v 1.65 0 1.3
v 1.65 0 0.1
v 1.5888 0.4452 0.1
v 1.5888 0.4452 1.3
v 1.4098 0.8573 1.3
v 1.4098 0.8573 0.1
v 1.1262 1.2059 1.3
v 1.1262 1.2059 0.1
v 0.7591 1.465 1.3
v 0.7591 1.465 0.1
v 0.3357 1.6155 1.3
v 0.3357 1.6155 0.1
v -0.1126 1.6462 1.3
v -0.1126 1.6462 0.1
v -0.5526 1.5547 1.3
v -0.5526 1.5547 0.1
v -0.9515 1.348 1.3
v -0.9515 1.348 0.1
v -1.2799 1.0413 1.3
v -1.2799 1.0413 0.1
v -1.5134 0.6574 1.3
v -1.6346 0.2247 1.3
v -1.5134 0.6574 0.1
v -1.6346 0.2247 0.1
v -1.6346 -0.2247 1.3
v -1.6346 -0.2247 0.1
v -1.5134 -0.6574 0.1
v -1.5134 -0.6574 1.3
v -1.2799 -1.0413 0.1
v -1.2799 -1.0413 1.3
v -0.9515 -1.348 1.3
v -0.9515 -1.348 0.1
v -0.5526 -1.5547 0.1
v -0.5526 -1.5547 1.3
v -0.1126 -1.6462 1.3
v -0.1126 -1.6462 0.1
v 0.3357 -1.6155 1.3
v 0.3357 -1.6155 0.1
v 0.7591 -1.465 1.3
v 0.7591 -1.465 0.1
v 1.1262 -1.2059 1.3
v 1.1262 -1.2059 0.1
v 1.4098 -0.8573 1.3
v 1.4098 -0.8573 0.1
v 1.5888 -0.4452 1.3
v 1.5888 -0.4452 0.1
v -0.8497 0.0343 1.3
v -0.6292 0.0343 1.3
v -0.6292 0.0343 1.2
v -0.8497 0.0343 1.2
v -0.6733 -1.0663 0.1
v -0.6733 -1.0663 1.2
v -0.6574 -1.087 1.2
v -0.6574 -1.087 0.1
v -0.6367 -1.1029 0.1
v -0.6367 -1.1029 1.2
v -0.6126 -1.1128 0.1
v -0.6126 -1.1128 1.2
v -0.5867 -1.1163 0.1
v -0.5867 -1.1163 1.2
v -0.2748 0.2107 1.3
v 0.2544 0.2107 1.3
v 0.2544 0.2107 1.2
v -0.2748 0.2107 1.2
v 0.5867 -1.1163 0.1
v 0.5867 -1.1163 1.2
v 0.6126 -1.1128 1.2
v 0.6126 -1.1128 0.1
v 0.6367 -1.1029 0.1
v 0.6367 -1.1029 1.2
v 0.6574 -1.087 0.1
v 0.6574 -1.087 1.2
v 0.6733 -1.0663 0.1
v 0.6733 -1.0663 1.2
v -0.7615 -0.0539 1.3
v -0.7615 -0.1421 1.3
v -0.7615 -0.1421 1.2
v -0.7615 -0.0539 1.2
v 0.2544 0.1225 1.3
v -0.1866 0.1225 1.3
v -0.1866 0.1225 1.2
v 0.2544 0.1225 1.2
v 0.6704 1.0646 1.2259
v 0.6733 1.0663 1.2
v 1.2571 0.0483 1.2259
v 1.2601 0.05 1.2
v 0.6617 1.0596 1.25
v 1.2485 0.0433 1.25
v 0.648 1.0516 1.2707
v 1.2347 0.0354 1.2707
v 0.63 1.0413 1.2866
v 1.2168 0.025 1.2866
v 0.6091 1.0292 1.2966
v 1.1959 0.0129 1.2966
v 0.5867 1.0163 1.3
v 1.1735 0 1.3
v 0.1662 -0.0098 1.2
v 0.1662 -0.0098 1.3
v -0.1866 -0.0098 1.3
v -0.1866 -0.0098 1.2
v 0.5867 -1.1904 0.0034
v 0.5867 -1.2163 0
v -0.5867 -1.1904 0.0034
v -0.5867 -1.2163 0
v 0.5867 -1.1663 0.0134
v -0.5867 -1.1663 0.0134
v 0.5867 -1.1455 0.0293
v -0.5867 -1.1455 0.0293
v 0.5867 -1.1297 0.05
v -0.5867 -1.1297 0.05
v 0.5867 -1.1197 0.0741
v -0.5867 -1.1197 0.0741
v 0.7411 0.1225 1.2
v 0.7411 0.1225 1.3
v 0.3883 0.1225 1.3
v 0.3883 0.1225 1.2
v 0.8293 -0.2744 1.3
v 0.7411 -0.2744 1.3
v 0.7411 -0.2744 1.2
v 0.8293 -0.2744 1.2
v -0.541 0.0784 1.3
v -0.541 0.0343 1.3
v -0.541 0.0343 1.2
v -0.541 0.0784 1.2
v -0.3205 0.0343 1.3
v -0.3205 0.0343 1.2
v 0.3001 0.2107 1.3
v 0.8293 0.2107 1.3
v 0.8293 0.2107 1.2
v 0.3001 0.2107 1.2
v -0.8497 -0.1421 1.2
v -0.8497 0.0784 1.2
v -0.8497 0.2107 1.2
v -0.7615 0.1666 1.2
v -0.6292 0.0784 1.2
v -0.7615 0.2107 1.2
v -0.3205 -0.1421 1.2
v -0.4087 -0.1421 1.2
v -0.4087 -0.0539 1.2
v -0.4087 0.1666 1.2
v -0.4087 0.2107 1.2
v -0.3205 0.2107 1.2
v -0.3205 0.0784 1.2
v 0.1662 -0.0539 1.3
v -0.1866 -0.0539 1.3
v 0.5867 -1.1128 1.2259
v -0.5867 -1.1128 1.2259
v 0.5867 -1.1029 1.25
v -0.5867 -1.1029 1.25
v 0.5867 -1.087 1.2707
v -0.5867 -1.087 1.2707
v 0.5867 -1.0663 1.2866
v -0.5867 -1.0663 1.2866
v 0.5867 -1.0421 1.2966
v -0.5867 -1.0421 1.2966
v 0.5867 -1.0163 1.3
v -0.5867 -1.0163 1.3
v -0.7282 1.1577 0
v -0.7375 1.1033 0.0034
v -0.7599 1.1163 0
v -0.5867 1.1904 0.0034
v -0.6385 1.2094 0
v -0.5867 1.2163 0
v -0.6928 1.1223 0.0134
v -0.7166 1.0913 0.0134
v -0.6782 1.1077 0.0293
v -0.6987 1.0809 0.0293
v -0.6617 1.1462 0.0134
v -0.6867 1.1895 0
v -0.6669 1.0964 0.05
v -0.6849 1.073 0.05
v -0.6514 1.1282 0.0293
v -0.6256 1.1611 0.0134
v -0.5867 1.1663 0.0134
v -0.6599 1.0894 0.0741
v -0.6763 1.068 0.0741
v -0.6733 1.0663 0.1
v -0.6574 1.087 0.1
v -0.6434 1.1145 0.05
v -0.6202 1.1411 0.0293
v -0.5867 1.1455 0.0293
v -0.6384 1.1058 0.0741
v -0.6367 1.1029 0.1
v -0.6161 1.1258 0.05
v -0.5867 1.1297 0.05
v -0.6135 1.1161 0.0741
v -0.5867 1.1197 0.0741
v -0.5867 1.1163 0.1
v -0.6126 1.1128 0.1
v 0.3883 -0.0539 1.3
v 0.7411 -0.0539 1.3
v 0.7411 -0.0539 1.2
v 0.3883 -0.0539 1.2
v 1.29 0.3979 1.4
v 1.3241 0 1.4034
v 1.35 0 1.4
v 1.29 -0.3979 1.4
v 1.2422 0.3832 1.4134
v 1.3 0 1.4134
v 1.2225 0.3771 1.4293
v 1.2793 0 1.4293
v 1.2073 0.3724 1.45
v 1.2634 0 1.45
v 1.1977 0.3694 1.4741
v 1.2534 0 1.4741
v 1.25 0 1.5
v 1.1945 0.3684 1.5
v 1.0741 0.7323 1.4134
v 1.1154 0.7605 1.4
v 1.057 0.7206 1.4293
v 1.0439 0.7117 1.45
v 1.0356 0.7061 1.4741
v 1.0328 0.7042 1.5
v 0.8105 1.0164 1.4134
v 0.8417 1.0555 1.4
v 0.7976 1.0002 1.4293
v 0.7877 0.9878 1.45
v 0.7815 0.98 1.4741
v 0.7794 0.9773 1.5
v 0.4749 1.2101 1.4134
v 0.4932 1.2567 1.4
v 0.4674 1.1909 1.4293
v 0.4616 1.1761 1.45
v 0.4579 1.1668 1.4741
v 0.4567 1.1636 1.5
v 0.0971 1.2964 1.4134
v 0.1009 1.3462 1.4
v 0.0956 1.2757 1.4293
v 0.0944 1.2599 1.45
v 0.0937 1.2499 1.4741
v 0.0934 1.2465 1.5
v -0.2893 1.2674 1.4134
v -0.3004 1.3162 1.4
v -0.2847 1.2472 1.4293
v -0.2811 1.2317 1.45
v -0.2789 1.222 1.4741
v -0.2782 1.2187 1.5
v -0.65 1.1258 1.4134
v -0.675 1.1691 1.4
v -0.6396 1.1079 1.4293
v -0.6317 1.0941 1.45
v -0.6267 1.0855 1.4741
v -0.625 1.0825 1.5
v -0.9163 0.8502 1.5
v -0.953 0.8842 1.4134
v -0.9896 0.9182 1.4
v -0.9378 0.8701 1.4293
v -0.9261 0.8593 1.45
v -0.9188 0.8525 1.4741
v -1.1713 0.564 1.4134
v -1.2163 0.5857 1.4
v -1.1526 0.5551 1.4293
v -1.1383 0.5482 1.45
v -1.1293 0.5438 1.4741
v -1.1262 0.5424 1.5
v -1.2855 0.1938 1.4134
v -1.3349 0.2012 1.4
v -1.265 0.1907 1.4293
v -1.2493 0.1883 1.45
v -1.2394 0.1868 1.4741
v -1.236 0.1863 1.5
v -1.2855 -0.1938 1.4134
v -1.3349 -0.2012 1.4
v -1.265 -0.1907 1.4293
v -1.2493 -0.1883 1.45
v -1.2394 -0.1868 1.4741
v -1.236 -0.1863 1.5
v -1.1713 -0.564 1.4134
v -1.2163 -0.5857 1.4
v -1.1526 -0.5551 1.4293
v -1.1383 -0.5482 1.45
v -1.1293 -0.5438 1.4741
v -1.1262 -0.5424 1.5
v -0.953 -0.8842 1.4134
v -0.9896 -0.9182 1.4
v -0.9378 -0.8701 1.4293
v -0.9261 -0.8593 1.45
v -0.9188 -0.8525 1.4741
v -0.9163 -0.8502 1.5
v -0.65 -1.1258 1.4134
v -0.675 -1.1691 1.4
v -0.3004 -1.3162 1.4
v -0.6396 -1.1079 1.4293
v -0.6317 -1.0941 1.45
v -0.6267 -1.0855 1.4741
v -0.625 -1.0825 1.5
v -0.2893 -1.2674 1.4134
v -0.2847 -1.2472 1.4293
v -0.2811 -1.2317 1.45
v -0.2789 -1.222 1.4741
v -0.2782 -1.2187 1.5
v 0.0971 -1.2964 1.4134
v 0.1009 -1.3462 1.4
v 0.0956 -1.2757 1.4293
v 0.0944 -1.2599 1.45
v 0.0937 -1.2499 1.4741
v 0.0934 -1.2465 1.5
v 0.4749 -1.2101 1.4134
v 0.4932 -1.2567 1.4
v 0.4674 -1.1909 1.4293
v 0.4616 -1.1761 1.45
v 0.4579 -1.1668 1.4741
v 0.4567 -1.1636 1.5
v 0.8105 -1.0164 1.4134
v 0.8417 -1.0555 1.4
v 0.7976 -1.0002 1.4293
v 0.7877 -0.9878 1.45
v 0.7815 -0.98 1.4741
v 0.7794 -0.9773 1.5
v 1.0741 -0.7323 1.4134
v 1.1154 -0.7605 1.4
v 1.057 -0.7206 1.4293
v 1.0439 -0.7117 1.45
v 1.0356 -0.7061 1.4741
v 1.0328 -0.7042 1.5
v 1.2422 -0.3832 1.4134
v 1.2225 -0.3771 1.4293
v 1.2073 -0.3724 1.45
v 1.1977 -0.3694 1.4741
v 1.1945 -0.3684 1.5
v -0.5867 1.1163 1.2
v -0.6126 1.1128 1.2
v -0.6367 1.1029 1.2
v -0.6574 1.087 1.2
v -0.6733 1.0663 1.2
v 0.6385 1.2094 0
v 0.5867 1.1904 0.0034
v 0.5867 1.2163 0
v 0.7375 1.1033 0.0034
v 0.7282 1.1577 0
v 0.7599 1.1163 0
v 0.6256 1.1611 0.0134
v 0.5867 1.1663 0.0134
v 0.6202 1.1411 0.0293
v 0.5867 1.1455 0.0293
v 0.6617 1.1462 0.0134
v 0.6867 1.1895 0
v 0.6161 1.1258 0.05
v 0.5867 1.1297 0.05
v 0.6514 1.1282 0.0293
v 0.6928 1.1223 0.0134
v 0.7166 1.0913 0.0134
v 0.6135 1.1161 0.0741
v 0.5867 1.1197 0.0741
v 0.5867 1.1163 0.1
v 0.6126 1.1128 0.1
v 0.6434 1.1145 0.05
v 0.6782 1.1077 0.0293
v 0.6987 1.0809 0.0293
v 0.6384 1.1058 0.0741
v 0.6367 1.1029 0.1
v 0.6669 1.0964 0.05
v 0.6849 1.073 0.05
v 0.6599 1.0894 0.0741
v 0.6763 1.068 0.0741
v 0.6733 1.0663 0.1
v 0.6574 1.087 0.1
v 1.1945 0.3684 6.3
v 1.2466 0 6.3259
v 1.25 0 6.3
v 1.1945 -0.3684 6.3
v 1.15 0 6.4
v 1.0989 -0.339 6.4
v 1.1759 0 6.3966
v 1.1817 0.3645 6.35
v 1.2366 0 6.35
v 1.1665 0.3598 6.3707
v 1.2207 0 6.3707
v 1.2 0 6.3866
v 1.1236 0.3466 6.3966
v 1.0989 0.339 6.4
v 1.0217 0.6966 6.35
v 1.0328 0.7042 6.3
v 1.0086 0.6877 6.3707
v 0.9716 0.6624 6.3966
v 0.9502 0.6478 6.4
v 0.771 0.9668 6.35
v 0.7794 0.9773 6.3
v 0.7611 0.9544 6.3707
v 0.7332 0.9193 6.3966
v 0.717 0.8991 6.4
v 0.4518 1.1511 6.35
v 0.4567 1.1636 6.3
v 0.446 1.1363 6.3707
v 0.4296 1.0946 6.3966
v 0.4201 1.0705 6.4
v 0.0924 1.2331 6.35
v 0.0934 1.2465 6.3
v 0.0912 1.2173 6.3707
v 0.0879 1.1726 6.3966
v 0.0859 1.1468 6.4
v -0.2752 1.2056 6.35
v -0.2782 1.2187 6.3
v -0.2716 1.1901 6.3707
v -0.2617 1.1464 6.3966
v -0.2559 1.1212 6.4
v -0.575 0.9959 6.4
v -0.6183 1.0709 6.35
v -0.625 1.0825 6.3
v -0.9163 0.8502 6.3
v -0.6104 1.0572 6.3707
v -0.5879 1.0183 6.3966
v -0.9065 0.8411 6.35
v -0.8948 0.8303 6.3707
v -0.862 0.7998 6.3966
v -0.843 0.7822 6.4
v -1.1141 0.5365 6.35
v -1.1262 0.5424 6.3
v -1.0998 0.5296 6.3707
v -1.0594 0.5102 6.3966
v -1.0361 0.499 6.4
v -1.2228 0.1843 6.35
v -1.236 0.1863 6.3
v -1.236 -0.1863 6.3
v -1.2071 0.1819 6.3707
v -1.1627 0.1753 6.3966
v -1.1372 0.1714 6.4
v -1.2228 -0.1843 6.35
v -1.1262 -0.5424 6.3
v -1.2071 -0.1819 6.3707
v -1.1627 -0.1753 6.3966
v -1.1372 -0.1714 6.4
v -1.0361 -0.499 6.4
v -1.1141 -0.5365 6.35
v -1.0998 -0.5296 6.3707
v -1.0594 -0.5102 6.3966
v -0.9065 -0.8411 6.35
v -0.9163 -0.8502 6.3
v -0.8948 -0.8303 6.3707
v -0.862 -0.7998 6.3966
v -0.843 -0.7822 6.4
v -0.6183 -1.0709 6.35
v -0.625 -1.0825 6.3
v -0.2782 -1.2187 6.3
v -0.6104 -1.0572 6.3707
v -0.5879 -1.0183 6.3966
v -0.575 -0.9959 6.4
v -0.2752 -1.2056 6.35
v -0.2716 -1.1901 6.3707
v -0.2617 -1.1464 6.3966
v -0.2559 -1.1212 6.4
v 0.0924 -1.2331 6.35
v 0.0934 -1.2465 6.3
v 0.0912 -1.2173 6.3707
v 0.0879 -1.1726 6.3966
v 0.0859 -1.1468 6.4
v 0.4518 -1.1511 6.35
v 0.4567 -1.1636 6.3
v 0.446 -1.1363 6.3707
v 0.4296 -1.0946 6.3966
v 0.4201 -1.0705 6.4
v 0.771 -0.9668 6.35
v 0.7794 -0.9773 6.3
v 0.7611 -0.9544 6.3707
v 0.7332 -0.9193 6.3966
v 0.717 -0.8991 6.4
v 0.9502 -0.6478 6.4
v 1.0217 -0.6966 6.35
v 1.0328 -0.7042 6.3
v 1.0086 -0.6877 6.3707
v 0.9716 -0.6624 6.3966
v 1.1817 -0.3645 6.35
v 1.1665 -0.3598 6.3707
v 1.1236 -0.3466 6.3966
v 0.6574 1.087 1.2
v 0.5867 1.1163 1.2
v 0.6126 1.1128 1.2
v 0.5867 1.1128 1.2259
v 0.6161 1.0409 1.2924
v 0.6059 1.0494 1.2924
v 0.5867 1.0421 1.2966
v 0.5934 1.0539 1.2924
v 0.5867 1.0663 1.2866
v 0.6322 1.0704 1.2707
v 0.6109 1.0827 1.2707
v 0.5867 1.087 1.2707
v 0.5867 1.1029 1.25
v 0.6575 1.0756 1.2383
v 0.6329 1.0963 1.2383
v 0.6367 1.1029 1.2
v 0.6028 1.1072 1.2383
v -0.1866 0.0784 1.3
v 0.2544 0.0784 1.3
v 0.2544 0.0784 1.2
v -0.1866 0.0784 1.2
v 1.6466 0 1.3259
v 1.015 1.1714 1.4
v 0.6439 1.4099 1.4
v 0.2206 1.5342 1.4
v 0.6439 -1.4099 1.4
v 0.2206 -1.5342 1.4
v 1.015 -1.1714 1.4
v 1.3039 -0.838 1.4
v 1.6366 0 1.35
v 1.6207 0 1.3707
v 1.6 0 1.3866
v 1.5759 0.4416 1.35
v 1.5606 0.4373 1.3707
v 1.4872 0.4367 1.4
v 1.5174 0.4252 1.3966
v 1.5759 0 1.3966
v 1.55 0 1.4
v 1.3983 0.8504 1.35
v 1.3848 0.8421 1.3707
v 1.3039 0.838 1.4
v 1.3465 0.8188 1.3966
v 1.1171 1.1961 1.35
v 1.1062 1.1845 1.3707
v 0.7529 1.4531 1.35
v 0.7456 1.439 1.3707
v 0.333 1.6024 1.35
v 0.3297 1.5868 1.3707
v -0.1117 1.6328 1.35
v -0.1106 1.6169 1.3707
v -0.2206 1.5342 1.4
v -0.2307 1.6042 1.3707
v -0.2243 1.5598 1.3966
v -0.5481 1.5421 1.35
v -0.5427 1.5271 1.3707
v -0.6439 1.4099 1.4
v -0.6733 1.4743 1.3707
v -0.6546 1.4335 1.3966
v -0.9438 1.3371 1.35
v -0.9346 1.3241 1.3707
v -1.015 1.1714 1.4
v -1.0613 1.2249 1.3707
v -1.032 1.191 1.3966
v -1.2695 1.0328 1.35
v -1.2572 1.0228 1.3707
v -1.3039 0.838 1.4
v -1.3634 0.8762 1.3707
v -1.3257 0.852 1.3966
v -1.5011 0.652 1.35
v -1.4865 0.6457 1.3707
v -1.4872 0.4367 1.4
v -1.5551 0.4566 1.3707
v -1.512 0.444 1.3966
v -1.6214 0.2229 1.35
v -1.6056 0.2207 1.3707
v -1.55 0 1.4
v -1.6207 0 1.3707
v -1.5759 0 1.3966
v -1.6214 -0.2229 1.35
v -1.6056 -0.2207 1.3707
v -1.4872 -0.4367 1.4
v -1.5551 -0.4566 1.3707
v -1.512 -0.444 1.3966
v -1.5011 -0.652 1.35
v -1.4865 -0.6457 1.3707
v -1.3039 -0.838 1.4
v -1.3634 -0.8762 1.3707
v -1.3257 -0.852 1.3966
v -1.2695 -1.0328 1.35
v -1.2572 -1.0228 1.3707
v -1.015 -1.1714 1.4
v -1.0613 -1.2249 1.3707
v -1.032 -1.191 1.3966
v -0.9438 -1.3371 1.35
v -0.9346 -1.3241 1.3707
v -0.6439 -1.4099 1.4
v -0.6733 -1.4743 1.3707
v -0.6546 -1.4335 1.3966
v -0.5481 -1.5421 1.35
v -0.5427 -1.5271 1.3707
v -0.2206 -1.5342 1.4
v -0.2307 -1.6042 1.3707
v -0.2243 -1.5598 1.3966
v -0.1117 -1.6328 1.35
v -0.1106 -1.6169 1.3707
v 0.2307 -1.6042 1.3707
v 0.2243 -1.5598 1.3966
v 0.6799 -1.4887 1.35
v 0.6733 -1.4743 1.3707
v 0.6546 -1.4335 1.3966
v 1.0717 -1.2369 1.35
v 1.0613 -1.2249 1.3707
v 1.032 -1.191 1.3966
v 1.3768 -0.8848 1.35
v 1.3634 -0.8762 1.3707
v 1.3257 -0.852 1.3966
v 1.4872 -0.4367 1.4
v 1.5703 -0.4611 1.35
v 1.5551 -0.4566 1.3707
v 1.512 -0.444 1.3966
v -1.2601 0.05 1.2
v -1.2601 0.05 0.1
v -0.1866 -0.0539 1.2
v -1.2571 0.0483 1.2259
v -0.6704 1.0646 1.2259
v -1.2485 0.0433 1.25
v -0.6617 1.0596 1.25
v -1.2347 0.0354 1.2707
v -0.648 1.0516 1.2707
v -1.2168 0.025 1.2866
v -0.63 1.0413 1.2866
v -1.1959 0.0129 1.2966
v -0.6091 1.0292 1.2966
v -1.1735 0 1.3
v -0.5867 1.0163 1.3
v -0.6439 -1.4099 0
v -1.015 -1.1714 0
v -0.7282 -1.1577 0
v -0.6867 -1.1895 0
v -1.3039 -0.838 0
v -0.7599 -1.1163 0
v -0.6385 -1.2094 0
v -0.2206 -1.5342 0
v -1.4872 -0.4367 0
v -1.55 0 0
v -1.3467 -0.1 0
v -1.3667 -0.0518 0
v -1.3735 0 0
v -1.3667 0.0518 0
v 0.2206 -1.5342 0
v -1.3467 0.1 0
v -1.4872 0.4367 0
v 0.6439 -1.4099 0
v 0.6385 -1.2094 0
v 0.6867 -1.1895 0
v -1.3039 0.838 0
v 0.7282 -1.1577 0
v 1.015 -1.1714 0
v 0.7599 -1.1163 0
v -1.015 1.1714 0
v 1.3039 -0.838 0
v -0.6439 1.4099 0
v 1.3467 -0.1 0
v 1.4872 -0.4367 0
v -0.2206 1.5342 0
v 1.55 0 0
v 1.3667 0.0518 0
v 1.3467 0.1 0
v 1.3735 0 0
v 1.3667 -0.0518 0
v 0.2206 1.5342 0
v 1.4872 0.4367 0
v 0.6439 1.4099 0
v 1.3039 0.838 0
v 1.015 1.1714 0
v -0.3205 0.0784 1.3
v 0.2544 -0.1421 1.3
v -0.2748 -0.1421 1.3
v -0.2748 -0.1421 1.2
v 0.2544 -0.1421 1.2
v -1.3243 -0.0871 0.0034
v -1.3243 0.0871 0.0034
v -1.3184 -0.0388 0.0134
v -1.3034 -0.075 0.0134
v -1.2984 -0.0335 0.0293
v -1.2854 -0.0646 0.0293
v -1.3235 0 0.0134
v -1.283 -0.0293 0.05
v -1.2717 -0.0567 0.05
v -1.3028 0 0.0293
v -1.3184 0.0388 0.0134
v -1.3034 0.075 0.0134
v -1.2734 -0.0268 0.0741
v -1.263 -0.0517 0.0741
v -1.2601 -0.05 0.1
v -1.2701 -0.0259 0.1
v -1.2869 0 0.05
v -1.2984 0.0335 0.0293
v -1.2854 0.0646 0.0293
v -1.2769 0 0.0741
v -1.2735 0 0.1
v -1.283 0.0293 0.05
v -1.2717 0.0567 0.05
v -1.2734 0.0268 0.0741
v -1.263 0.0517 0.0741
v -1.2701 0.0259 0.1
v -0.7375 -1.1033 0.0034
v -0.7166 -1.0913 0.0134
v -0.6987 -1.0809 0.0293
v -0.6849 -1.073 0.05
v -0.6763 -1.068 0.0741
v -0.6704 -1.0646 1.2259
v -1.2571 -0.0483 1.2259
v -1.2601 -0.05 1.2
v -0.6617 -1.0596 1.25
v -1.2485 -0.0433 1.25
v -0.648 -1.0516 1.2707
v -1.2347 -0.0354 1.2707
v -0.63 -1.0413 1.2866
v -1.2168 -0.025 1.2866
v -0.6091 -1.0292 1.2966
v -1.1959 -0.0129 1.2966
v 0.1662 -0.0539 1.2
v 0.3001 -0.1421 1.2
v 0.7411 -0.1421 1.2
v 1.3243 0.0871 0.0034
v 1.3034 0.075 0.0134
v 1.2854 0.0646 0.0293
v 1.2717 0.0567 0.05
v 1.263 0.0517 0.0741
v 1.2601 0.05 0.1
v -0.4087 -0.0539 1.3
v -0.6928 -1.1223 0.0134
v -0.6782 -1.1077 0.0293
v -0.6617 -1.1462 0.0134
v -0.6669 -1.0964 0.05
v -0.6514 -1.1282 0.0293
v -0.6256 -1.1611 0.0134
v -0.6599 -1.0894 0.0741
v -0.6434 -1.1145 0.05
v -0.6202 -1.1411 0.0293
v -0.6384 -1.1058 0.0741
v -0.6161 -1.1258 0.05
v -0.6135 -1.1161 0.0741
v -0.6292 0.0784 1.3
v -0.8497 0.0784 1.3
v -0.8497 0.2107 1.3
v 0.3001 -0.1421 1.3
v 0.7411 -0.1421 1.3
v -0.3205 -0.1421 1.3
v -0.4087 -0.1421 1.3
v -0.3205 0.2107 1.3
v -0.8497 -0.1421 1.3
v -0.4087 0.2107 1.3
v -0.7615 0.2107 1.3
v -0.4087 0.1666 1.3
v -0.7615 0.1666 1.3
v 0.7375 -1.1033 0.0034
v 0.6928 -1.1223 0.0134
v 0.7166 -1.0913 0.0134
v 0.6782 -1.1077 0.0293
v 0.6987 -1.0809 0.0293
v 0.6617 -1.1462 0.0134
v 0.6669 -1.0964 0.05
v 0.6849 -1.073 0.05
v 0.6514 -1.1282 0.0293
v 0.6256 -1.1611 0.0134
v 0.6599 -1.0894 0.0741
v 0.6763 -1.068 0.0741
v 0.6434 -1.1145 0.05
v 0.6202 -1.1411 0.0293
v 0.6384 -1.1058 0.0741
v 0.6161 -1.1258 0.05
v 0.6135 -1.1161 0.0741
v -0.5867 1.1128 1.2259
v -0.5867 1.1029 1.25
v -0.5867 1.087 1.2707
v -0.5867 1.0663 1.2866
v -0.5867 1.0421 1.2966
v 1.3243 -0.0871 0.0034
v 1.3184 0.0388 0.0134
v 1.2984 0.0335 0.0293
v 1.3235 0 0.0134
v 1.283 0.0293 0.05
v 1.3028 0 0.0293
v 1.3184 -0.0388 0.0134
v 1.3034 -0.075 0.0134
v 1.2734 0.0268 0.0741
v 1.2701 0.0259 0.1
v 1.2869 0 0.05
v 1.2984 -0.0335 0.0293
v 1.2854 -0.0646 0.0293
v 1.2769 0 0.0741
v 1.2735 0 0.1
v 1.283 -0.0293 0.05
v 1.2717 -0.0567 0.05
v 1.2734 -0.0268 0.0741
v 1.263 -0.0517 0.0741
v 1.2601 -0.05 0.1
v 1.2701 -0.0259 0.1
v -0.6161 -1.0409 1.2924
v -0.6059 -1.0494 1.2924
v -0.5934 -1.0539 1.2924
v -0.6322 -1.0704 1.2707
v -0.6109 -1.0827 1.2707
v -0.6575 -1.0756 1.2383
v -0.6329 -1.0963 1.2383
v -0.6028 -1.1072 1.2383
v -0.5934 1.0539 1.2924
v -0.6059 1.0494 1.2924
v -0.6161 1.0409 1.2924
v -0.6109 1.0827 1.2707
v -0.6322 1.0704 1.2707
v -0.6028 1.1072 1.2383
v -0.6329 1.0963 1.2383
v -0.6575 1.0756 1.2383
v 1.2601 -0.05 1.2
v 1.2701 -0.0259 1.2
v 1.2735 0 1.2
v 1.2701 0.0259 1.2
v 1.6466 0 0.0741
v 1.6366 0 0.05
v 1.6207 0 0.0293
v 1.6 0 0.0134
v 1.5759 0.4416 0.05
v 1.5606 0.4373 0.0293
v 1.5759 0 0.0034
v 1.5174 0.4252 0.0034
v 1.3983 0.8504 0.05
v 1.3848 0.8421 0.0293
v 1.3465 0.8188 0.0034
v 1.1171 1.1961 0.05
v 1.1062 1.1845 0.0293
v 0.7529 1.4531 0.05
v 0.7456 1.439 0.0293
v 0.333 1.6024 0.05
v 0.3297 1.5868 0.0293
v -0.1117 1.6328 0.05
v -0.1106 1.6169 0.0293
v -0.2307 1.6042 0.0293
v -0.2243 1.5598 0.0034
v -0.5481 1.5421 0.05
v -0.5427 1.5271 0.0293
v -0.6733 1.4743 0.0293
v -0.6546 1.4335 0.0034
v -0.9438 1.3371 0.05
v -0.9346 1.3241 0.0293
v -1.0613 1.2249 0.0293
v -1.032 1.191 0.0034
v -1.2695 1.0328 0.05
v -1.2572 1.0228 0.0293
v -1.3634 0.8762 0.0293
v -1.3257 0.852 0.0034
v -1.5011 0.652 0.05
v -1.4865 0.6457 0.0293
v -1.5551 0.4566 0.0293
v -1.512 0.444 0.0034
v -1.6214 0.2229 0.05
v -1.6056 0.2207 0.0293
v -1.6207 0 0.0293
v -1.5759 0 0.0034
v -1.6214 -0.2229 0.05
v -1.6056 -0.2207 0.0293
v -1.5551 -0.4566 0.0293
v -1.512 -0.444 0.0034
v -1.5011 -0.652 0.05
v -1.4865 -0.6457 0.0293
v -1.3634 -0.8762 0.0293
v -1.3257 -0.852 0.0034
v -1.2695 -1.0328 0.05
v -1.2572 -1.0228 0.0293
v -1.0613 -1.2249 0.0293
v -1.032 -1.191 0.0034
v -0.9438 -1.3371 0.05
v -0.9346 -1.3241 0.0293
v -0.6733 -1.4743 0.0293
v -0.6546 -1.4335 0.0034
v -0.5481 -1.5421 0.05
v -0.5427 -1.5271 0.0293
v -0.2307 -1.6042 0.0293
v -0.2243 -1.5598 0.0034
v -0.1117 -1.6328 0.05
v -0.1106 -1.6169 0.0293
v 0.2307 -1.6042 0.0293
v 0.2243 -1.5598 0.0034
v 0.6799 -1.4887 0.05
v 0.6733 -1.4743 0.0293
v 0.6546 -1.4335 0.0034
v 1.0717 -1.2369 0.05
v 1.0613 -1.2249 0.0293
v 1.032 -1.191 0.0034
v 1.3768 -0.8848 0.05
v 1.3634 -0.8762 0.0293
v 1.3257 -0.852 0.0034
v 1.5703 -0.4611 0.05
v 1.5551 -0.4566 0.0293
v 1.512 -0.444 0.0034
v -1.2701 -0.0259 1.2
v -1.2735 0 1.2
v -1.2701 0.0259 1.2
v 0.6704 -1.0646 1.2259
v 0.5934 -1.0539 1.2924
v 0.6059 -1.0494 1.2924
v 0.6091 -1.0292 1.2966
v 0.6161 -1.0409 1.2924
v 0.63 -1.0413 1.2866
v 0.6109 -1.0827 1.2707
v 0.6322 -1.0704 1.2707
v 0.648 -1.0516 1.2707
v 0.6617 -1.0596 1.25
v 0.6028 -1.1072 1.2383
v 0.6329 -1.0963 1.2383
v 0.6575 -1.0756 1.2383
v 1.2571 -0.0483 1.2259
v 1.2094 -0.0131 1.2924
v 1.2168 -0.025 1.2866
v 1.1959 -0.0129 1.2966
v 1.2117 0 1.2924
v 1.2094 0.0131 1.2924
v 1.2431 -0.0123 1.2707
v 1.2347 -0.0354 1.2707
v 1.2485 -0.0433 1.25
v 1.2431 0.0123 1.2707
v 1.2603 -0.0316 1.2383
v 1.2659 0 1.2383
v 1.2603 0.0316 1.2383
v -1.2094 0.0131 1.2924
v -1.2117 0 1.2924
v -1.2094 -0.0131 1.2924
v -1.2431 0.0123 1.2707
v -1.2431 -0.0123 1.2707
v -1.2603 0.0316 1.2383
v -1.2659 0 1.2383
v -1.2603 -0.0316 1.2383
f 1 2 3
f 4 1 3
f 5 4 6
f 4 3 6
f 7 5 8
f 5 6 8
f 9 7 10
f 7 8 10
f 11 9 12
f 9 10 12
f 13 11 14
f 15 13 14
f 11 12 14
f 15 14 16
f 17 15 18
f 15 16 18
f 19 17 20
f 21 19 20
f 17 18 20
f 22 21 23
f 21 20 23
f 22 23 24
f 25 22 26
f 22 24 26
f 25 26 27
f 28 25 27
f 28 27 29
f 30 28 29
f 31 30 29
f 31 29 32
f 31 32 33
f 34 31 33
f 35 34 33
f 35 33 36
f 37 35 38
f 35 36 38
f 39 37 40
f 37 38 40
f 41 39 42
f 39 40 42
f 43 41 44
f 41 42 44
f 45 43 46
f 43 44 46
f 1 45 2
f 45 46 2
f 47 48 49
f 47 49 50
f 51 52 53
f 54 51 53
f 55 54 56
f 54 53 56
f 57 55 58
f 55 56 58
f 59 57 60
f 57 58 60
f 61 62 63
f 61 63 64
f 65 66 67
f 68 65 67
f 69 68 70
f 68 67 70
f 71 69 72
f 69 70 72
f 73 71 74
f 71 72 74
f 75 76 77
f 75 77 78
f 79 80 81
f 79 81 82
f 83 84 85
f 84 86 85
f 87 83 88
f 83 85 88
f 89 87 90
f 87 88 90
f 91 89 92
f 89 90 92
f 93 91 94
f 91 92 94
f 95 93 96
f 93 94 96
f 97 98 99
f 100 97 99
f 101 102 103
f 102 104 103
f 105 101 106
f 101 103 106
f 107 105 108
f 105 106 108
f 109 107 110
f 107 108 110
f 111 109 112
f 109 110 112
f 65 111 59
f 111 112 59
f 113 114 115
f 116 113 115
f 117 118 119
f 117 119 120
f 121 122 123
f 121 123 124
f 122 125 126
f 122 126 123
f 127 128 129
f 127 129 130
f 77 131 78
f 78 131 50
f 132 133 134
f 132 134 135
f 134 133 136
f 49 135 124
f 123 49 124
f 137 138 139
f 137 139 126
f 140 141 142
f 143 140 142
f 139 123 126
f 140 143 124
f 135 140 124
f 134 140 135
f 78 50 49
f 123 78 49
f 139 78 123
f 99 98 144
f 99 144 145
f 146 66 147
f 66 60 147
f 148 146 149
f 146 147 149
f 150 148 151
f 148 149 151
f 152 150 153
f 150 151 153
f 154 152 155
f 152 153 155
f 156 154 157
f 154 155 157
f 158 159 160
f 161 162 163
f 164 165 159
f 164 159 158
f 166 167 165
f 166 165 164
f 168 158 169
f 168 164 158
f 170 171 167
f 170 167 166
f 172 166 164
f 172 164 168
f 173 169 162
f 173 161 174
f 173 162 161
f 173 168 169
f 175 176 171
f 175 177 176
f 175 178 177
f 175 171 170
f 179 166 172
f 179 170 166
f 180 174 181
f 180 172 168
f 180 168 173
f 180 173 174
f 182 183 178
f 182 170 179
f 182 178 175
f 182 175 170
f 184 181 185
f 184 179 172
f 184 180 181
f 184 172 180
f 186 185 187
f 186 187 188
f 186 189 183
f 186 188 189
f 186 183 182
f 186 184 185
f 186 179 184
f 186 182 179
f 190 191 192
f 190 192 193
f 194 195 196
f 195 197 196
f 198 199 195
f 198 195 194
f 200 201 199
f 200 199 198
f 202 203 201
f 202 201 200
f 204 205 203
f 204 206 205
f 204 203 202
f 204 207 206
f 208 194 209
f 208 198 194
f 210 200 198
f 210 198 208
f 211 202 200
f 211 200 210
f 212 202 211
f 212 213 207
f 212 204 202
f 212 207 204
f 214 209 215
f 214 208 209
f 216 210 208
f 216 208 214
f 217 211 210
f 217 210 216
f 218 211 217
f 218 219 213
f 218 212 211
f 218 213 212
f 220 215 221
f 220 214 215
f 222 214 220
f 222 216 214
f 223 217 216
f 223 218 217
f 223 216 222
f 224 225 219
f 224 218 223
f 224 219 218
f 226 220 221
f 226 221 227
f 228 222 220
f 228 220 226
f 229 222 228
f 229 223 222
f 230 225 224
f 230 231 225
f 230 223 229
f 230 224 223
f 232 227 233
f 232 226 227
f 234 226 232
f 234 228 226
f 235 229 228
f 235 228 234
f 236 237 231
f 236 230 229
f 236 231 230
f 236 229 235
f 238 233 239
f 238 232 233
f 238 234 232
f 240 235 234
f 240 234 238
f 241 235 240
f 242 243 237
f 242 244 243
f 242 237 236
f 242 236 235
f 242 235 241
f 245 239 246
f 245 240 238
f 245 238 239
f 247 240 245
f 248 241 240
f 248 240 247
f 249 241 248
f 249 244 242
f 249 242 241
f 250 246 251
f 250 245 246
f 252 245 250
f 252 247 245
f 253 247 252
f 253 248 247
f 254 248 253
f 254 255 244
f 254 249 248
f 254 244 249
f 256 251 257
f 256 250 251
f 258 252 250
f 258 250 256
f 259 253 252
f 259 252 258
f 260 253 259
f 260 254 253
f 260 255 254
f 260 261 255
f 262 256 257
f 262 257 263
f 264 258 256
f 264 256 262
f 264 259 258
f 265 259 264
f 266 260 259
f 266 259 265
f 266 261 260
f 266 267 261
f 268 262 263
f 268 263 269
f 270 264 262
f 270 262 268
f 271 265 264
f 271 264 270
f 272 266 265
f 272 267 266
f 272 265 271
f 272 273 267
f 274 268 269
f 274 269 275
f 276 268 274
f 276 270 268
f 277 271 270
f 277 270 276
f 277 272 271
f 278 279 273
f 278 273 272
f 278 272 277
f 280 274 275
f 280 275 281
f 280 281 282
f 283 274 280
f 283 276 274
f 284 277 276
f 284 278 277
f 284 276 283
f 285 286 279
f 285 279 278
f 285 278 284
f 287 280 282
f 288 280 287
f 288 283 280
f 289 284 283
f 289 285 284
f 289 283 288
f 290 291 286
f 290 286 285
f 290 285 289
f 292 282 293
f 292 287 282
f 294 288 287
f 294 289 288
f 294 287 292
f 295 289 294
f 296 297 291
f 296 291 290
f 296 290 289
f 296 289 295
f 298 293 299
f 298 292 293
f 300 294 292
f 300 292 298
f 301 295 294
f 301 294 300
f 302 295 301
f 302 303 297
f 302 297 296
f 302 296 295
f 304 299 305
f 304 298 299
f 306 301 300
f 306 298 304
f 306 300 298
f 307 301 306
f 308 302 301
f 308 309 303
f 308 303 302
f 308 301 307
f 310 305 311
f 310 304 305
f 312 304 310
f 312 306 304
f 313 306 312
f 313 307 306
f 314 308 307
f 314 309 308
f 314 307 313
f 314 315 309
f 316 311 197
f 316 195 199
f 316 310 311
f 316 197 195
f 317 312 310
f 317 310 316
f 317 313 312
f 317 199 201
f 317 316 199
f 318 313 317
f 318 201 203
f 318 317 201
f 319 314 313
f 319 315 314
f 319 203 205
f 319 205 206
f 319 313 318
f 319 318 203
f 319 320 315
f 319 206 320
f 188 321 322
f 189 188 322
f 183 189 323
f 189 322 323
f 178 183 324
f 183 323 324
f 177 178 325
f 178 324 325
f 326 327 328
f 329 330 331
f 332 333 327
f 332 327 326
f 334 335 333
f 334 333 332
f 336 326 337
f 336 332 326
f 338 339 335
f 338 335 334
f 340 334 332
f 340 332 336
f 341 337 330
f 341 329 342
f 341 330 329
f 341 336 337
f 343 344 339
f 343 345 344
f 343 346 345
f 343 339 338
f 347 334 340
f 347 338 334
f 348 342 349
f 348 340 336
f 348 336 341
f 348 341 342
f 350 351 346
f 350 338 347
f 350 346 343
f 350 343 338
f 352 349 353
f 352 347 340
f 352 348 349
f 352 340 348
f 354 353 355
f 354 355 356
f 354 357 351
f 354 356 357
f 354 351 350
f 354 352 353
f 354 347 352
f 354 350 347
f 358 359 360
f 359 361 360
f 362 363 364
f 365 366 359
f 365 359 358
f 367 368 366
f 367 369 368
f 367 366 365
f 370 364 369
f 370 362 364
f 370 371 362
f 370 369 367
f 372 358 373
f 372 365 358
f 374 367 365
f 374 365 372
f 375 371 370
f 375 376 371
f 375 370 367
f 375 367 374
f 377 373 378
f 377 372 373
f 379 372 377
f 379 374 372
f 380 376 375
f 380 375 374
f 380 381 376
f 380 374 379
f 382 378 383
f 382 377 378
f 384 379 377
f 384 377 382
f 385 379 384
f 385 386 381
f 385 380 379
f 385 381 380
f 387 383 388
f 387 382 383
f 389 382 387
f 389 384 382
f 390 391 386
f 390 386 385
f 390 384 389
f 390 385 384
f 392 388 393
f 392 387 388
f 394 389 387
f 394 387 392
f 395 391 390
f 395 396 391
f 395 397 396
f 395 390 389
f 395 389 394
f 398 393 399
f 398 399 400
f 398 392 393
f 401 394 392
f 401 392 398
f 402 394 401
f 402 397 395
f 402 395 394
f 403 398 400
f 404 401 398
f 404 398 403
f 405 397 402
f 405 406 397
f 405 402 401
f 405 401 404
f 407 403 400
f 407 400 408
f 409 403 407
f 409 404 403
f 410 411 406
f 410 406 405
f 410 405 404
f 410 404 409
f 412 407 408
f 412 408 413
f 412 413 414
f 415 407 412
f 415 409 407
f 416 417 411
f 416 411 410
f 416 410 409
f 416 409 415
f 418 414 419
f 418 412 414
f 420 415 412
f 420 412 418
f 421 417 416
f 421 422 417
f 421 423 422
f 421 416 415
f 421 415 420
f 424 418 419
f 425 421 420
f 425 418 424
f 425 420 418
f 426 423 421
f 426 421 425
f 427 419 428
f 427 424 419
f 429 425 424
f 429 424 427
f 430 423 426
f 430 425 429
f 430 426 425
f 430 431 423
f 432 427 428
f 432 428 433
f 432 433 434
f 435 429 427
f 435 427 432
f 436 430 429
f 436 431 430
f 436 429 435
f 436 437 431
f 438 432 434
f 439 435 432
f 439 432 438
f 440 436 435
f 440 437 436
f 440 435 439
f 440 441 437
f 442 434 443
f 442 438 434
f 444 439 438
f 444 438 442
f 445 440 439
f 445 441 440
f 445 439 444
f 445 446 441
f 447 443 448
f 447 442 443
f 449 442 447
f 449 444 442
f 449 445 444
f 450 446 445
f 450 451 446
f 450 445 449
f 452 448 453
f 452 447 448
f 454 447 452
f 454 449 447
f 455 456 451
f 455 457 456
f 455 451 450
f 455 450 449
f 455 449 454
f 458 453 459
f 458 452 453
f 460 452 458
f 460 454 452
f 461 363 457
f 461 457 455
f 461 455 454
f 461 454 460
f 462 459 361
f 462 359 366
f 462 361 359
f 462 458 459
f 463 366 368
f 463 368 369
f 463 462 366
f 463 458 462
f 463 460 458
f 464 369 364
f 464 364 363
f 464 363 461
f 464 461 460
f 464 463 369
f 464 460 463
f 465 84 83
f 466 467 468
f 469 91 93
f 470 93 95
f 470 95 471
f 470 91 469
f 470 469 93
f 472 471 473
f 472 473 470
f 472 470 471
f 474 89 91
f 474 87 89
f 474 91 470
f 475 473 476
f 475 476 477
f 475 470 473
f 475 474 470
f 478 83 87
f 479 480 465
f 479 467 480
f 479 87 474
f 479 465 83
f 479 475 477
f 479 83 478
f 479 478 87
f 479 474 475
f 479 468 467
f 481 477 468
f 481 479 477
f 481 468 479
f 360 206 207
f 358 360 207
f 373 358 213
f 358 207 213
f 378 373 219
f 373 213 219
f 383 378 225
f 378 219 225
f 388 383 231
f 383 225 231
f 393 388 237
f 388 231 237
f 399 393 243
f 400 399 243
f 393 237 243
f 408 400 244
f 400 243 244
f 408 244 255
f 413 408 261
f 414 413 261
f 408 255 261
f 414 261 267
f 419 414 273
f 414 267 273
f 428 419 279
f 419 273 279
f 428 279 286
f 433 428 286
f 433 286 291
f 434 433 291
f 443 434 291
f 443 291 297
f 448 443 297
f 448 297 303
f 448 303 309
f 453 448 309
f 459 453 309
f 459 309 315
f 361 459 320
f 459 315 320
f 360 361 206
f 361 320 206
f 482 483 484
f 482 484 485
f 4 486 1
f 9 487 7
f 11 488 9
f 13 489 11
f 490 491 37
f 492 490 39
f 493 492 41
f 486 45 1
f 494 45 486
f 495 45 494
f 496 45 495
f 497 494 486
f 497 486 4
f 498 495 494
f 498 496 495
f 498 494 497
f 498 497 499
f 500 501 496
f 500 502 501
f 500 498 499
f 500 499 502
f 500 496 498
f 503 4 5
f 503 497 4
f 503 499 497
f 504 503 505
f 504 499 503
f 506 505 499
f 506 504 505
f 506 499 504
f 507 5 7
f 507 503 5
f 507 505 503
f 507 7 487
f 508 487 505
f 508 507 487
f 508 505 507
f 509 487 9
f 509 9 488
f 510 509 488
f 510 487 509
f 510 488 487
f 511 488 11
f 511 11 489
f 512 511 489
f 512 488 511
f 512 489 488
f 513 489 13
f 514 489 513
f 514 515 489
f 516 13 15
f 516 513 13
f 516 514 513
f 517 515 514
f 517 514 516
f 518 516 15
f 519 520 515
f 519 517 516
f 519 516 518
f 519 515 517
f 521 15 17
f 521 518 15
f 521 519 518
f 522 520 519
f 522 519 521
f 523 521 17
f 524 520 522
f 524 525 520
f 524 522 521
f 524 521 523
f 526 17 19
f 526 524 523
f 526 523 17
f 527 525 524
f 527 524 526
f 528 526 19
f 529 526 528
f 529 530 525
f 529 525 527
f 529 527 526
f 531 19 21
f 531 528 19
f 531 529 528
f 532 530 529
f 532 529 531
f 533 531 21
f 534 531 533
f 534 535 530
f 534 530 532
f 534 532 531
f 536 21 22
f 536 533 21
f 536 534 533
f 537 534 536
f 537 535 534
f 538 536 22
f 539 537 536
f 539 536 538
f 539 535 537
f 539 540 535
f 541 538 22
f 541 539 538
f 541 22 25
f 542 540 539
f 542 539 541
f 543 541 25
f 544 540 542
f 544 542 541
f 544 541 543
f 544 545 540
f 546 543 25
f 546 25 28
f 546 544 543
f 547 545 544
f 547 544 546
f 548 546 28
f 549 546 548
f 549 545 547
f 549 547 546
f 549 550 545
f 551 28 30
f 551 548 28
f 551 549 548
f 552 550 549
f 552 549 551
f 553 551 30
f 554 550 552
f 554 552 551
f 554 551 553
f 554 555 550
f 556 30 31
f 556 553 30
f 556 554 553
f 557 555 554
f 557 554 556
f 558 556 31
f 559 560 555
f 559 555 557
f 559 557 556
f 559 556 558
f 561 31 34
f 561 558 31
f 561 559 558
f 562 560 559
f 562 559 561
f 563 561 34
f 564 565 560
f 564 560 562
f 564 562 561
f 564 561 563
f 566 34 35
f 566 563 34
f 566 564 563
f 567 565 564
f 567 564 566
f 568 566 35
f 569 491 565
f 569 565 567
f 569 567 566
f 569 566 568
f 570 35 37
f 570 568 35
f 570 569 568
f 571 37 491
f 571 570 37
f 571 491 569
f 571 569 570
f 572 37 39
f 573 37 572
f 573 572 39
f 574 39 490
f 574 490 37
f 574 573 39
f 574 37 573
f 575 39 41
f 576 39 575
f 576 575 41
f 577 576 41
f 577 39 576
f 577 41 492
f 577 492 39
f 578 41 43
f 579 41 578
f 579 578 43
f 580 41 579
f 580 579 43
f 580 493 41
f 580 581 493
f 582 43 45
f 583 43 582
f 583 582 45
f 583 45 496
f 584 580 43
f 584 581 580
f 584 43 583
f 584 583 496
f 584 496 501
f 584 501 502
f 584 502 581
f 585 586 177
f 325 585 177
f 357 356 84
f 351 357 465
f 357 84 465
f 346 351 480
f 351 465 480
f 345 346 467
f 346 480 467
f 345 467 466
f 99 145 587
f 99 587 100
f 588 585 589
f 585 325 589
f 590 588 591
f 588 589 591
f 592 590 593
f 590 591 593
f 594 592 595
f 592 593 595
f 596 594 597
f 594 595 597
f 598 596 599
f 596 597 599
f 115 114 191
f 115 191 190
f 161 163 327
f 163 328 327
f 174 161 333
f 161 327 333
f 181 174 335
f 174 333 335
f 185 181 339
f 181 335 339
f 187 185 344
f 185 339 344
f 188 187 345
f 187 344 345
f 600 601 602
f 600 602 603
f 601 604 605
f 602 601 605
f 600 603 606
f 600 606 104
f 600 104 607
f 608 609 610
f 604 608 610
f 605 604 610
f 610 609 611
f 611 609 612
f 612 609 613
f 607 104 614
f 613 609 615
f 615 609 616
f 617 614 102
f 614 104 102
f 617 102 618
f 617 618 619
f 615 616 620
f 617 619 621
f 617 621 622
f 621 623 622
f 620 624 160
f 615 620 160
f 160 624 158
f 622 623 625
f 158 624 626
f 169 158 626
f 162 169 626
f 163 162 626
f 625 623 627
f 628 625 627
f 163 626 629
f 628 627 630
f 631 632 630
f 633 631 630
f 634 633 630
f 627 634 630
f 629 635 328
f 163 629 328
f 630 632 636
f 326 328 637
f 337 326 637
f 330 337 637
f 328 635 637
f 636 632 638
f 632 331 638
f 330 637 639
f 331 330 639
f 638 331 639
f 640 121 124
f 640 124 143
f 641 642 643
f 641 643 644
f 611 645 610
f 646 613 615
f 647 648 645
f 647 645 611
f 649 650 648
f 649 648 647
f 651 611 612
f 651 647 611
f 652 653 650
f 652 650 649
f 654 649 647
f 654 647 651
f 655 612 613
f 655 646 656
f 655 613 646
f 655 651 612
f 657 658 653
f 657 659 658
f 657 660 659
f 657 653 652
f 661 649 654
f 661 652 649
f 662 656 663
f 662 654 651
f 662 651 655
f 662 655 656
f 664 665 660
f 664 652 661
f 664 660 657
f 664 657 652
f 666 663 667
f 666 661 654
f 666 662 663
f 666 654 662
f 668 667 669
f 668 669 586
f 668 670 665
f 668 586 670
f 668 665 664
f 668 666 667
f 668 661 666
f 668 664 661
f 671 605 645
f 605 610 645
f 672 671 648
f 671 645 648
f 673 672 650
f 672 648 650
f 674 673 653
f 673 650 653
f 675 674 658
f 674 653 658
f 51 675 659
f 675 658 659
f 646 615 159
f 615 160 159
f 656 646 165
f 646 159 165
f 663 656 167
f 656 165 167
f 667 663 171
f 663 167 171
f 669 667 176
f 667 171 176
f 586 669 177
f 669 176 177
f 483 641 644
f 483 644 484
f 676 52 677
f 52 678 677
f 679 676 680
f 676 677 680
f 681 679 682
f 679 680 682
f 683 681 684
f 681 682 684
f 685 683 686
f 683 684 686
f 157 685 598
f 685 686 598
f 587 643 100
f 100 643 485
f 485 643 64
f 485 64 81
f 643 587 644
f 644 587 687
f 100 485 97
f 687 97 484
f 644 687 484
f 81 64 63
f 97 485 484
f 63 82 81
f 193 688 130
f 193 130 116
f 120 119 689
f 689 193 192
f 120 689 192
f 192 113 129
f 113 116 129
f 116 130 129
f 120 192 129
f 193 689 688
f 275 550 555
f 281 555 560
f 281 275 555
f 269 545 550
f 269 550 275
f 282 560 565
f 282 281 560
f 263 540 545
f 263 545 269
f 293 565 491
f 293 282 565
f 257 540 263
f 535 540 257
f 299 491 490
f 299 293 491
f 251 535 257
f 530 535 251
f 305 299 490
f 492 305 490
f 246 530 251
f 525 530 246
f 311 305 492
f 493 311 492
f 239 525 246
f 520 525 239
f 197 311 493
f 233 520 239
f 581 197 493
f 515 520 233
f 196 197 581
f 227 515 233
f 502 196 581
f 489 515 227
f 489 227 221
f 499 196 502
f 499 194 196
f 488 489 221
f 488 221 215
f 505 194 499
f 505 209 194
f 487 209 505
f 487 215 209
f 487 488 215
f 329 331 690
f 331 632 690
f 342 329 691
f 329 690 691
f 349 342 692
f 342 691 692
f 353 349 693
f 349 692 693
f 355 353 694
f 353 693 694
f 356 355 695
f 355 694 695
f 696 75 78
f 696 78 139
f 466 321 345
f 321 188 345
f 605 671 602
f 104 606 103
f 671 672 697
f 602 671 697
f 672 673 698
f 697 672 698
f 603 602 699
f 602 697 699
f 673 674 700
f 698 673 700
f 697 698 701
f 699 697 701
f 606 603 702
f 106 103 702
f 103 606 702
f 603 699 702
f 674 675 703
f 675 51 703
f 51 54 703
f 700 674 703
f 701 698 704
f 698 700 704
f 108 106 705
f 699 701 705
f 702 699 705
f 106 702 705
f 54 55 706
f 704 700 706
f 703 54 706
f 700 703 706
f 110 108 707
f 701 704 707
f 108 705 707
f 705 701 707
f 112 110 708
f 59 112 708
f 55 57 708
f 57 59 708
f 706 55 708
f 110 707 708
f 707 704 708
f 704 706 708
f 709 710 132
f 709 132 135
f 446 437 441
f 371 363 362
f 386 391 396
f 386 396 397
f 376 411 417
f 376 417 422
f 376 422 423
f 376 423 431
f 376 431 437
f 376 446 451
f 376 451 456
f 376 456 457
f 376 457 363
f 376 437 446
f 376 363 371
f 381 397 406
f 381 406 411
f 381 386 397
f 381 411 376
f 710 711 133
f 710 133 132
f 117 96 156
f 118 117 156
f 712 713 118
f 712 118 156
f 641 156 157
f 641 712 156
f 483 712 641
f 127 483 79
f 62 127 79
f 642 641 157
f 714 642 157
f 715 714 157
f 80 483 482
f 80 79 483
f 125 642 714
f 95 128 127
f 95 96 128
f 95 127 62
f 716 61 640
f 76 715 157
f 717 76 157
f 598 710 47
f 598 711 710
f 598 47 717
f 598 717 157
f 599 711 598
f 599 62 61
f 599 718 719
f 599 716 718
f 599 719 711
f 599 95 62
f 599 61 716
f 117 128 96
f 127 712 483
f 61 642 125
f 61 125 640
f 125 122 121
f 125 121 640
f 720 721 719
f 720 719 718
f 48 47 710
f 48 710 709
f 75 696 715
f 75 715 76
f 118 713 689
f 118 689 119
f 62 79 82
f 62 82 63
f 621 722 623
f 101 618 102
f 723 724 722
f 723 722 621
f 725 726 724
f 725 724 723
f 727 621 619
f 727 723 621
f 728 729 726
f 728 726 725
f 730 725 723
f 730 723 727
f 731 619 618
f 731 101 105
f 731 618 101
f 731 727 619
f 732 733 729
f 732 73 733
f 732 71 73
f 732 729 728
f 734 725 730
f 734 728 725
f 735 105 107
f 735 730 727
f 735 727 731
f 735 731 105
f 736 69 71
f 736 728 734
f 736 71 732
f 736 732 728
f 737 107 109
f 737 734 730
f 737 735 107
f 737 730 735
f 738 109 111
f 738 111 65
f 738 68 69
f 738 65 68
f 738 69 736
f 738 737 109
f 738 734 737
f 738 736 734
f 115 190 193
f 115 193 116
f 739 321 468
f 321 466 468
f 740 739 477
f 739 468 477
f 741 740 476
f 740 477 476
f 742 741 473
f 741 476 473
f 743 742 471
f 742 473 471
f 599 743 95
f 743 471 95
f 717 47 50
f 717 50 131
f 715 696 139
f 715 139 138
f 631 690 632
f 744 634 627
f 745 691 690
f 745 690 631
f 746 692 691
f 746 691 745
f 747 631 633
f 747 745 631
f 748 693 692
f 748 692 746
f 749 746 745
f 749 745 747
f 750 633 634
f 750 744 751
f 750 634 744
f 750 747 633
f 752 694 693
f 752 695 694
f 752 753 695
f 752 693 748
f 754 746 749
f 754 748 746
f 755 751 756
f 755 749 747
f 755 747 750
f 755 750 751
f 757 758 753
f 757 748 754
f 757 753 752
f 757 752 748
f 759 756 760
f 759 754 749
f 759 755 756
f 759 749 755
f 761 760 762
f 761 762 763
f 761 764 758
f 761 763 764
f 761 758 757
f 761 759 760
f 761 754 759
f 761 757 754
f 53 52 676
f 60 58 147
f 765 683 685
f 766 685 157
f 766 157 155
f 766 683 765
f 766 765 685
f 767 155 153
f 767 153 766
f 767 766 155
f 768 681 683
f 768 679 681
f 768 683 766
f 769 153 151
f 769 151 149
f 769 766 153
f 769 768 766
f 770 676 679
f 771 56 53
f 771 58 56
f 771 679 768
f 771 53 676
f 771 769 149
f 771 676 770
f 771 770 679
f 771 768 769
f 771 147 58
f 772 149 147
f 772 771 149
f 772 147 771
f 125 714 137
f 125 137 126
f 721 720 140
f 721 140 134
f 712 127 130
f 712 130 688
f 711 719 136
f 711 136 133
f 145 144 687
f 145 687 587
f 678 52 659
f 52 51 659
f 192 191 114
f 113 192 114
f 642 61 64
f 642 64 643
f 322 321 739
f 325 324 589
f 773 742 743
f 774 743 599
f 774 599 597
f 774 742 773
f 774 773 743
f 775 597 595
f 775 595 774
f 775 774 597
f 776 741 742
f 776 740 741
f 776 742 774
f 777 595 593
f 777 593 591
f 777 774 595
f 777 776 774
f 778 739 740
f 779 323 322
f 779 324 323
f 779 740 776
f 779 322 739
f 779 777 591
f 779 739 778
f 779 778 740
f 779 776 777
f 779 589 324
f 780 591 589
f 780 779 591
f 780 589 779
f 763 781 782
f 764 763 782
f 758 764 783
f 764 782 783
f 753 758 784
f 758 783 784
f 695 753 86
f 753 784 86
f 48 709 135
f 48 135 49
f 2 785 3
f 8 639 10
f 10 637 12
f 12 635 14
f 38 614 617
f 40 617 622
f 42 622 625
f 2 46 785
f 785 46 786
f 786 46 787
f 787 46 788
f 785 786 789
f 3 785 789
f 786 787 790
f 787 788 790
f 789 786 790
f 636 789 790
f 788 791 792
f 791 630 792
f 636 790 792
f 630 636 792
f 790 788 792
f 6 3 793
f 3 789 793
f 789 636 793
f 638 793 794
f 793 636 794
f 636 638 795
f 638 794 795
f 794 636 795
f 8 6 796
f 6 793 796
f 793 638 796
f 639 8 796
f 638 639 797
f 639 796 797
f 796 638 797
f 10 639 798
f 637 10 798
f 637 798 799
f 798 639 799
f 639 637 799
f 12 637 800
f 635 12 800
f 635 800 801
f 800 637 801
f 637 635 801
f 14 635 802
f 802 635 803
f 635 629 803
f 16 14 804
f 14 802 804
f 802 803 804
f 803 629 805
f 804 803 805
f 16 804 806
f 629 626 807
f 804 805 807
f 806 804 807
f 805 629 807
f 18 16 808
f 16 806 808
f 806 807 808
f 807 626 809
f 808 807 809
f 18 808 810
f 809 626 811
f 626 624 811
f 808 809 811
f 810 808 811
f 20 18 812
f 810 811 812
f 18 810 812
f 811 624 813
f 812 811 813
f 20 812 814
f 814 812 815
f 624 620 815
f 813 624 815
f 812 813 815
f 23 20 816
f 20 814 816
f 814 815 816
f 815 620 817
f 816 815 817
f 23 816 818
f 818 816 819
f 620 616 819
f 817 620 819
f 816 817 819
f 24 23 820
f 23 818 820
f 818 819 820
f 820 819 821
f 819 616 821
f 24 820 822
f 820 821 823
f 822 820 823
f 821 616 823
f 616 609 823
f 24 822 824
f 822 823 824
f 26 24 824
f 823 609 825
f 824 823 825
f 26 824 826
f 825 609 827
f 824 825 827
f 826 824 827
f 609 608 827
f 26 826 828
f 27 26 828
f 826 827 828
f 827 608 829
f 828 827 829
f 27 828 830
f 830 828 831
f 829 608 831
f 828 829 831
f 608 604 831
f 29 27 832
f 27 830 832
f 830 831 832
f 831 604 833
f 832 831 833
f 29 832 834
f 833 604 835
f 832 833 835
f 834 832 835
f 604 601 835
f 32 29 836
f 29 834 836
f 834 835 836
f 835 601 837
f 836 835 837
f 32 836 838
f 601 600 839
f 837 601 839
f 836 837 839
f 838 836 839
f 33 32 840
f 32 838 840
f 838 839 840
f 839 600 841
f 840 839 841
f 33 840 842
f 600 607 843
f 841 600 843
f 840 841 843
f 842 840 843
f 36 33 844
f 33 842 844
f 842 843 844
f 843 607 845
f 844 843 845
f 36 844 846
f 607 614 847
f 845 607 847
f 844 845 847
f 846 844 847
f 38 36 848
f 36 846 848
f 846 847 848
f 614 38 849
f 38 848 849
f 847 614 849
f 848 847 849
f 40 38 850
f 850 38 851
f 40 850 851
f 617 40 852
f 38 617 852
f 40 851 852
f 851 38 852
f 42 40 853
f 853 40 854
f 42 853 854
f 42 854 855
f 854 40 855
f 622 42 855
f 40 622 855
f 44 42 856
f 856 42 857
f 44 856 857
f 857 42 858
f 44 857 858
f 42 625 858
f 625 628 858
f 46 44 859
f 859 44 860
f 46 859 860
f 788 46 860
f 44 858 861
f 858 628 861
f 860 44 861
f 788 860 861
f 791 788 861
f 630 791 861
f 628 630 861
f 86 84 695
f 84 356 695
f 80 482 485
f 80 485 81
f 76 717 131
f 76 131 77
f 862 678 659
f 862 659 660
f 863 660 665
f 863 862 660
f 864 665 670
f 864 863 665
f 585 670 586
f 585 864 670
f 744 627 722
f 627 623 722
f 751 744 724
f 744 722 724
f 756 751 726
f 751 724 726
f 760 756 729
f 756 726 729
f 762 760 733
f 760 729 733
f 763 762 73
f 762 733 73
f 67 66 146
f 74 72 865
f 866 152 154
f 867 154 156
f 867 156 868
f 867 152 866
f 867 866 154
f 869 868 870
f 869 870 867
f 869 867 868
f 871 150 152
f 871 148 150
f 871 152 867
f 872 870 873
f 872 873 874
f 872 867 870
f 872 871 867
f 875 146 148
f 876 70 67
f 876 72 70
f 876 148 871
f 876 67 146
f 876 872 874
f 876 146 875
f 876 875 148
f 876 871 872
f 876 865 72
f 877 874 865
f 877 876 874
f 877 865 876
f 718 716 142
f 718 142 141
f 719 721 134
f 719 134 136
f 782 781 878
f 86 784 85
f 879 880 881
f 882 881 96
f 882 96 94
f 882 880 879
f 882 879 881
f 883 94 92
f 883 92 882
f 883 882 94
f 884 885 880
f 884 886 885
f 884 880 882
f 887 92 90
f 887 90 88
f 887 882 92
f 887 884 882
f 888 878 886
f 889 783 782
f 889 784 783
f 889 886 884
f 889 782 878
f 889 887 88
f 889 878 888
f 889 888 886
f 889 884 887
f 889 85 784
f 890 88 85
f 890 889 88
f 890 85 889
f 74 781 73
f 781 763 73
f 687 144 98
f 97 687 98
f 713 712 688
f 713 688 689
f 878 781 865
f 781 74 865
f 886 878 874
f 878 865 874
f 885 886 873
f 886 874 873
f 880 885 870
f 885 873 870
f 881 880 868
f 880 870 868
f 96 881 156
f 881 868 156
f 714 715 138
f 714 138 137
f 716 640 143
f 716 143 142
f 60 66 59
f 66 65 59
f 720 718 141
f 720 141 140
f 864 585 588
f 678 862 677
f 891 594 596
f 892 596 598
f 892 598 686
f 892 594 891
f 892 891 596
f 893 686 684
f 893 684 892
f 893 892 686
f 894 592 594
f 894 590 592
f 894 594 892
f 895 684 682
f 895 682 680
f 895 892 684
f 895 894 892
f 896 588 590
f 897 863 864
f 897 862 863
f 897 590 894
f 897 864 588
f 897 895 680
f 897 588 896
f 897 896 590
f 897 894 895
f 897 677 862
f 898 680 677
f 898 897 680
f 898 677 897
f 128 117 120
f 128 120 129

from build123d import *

# Parameters (mm, degrees)
SKETCH1_R           = 1.65
BOSS_EXTRUDE1_DEPTH = 1.4
SKETCH2_R           = 1.25
BOSS_EXTRUDE2_DEPTH = 5
CUT_EXTRUDE1_DEPTH  = 1.3
FILLET1_R           = 0.1
SKETCH4_W           = 0.352777778
SKETCH4_H           = 0.176388889
SKETCH4_W_2         = 0.352777777
SKETCH4_H_2         = 0.044097222
BOSS_EXTRUDE3_DEPTH = 0.1


with BuildPart() as part:
    # Sketch1 → Boss-Extrude1 (new body)
    with BuildSketch(Plane.XY):
        Circle(SKETCH1_R)
    extrude(amount=BOSS_EXTRUDE1_DEPTH)

    # Sketch2 → Boss-Extrude2 (add)
    with BuildSketch(Plane.XY.offset(1.4)):
        Circle(SKETCH2_R)
    extrude(amount=BOSS_EXTRUDE2_DEPTH)

    # Sketch3 → Cut-Extrude1 (cut)
    with BuildSketch(Plane(origin=(0, 0, 0), x_dir=(-1, 0, 0), z_dir=(0, 0, -1))):
        Polygon((1.288941176, 0), (0.644470588, 1.116255803), (-0.644470588, 1.116255803), (-1.288941176, 0), (-0.644470588, -1.116255803), (0.644470588, -1.116255803), align=None)
    extrude(amount=-CUT_EXTRUDE1_DEPTH, mode=Mode.SUBTRACT)

    # Fillet1
    fillet1_edges = [part.edges().sort_by_distance(p)[0] for p in [
        (-0.966705882, -0.558127901, 1.3),
        (-1.288941176, 0, 0.65),
        (0, -1.116255803, 1.3),
        (-0.644470588, -1.116255803, 0.65),
        (0.966705882, -0.558127901, 1.3),
        (0.644470588, -1.116255803, 0.65),
        (0.966705882, 0.558127901, 1.3),
        (1.288941176, 0, 0.65),
        (0, 1.116255803, 1.3),
        (0.644470588, 1.116255803, 0.65),
        (-0.966705882, 0.558127901, 1.3),
        (-0.644470588, 1.116255803, 0.65),
        (-0.966705882, -0.558127901, 0),
        (-0.966705882, 0.558127901, 0),
        (0, 1.116255803, 0),
        (0.966705882, 0.558127901, 0),
        (0.966705882, -0.558127901, 0),
        (0, -1.116255803, 0),
        (-1.65, 0, 0),
        (-1.65, 0, 1.4),
        (-1.25, 0, 1.4),
        (-1.25, 0, 6.4),
    ]]
    fillet(fillet1_edges, radius=FILLET1_R)

    # Sketch4 → Boss-Extrude3 (add)
    # profile 1 of 3: a face of its own
    with BuildSketch(Plane(origin=(0, 0, 1.3), x_dir=(-1, 0, 0), z_dir=(0, 0, -1))):
        Polygon((-0.829270588, -0.274385784), (-0.829270588, 0.21068366), (-0.300103922, 0.21068366), (-0.300103922, -0.142094118), (-0.741076144, -0.142094118), (-0.741076144, -0.274385784), align=None)
        with Locations((-0.564687255, 0.034294772)):
            Rectangle(SKETCH4_W, SKETCH4_H, mode=Mode.SUBTRACT)
    # profile 2 of 3: a face of its own
    with BuildSketch(Plane(origin=(0, 0, 1.3), x_dir=(-1, 0, 0), z_dir=(0, 0, -1))):
        Polygon((-0.254373469, -0.142094118), (-0.254373469, 0.078391993), (0.186598753, 0.078391993), (0.186598753, 0.122489216), (-0.254373469, 0.122489216), (-0.254373469, 0.21068366), (0.274793198, 0.21068366), (0.274793198, -0.142094118), align=None)
        with Locations((0.010209864, -0.031851062)):
            Rectangle(SKETCH4_W_2, SKETCH4_H_2, mode=Mode.SUBTRACT)
    # profile 3 of 3: a face of its own
    with BuildSketch(Plane(origin=(0, 0, 1.3), x_dir=(-1, 0, 0), z_dir=(0, 0, -1))):
        Polygon((0.32052365, -0.142094118), (0.32052365, 0.034294771), (0.541009762, 0.034294771), (0.541009762, 0.078391993), (0.32052365, 0.078391993), (0.32052365, 0.21068366), (0.408718095, 0.21068366), (0.408718095, 0.166586438), (0.761495873, 0.166586438), (0.761495873, 0.21068366), (0.849690317, 0.21068366), (0.849690317, 0.078391993), (0.629204206, 0.078391993), (0.629204206, 0.034294771), (0.849690317, 0.034294771), (0.849690317, -0.142094118), (0.761495873, -0.142094118), (0.761495873, -0.053899673), (0.408718095, -0.053899673), (0.408718095, -0.142094118), align=None)
    extrude(amount=BOSS_EXTRUDE3_DEPTH)


solid = part.part
